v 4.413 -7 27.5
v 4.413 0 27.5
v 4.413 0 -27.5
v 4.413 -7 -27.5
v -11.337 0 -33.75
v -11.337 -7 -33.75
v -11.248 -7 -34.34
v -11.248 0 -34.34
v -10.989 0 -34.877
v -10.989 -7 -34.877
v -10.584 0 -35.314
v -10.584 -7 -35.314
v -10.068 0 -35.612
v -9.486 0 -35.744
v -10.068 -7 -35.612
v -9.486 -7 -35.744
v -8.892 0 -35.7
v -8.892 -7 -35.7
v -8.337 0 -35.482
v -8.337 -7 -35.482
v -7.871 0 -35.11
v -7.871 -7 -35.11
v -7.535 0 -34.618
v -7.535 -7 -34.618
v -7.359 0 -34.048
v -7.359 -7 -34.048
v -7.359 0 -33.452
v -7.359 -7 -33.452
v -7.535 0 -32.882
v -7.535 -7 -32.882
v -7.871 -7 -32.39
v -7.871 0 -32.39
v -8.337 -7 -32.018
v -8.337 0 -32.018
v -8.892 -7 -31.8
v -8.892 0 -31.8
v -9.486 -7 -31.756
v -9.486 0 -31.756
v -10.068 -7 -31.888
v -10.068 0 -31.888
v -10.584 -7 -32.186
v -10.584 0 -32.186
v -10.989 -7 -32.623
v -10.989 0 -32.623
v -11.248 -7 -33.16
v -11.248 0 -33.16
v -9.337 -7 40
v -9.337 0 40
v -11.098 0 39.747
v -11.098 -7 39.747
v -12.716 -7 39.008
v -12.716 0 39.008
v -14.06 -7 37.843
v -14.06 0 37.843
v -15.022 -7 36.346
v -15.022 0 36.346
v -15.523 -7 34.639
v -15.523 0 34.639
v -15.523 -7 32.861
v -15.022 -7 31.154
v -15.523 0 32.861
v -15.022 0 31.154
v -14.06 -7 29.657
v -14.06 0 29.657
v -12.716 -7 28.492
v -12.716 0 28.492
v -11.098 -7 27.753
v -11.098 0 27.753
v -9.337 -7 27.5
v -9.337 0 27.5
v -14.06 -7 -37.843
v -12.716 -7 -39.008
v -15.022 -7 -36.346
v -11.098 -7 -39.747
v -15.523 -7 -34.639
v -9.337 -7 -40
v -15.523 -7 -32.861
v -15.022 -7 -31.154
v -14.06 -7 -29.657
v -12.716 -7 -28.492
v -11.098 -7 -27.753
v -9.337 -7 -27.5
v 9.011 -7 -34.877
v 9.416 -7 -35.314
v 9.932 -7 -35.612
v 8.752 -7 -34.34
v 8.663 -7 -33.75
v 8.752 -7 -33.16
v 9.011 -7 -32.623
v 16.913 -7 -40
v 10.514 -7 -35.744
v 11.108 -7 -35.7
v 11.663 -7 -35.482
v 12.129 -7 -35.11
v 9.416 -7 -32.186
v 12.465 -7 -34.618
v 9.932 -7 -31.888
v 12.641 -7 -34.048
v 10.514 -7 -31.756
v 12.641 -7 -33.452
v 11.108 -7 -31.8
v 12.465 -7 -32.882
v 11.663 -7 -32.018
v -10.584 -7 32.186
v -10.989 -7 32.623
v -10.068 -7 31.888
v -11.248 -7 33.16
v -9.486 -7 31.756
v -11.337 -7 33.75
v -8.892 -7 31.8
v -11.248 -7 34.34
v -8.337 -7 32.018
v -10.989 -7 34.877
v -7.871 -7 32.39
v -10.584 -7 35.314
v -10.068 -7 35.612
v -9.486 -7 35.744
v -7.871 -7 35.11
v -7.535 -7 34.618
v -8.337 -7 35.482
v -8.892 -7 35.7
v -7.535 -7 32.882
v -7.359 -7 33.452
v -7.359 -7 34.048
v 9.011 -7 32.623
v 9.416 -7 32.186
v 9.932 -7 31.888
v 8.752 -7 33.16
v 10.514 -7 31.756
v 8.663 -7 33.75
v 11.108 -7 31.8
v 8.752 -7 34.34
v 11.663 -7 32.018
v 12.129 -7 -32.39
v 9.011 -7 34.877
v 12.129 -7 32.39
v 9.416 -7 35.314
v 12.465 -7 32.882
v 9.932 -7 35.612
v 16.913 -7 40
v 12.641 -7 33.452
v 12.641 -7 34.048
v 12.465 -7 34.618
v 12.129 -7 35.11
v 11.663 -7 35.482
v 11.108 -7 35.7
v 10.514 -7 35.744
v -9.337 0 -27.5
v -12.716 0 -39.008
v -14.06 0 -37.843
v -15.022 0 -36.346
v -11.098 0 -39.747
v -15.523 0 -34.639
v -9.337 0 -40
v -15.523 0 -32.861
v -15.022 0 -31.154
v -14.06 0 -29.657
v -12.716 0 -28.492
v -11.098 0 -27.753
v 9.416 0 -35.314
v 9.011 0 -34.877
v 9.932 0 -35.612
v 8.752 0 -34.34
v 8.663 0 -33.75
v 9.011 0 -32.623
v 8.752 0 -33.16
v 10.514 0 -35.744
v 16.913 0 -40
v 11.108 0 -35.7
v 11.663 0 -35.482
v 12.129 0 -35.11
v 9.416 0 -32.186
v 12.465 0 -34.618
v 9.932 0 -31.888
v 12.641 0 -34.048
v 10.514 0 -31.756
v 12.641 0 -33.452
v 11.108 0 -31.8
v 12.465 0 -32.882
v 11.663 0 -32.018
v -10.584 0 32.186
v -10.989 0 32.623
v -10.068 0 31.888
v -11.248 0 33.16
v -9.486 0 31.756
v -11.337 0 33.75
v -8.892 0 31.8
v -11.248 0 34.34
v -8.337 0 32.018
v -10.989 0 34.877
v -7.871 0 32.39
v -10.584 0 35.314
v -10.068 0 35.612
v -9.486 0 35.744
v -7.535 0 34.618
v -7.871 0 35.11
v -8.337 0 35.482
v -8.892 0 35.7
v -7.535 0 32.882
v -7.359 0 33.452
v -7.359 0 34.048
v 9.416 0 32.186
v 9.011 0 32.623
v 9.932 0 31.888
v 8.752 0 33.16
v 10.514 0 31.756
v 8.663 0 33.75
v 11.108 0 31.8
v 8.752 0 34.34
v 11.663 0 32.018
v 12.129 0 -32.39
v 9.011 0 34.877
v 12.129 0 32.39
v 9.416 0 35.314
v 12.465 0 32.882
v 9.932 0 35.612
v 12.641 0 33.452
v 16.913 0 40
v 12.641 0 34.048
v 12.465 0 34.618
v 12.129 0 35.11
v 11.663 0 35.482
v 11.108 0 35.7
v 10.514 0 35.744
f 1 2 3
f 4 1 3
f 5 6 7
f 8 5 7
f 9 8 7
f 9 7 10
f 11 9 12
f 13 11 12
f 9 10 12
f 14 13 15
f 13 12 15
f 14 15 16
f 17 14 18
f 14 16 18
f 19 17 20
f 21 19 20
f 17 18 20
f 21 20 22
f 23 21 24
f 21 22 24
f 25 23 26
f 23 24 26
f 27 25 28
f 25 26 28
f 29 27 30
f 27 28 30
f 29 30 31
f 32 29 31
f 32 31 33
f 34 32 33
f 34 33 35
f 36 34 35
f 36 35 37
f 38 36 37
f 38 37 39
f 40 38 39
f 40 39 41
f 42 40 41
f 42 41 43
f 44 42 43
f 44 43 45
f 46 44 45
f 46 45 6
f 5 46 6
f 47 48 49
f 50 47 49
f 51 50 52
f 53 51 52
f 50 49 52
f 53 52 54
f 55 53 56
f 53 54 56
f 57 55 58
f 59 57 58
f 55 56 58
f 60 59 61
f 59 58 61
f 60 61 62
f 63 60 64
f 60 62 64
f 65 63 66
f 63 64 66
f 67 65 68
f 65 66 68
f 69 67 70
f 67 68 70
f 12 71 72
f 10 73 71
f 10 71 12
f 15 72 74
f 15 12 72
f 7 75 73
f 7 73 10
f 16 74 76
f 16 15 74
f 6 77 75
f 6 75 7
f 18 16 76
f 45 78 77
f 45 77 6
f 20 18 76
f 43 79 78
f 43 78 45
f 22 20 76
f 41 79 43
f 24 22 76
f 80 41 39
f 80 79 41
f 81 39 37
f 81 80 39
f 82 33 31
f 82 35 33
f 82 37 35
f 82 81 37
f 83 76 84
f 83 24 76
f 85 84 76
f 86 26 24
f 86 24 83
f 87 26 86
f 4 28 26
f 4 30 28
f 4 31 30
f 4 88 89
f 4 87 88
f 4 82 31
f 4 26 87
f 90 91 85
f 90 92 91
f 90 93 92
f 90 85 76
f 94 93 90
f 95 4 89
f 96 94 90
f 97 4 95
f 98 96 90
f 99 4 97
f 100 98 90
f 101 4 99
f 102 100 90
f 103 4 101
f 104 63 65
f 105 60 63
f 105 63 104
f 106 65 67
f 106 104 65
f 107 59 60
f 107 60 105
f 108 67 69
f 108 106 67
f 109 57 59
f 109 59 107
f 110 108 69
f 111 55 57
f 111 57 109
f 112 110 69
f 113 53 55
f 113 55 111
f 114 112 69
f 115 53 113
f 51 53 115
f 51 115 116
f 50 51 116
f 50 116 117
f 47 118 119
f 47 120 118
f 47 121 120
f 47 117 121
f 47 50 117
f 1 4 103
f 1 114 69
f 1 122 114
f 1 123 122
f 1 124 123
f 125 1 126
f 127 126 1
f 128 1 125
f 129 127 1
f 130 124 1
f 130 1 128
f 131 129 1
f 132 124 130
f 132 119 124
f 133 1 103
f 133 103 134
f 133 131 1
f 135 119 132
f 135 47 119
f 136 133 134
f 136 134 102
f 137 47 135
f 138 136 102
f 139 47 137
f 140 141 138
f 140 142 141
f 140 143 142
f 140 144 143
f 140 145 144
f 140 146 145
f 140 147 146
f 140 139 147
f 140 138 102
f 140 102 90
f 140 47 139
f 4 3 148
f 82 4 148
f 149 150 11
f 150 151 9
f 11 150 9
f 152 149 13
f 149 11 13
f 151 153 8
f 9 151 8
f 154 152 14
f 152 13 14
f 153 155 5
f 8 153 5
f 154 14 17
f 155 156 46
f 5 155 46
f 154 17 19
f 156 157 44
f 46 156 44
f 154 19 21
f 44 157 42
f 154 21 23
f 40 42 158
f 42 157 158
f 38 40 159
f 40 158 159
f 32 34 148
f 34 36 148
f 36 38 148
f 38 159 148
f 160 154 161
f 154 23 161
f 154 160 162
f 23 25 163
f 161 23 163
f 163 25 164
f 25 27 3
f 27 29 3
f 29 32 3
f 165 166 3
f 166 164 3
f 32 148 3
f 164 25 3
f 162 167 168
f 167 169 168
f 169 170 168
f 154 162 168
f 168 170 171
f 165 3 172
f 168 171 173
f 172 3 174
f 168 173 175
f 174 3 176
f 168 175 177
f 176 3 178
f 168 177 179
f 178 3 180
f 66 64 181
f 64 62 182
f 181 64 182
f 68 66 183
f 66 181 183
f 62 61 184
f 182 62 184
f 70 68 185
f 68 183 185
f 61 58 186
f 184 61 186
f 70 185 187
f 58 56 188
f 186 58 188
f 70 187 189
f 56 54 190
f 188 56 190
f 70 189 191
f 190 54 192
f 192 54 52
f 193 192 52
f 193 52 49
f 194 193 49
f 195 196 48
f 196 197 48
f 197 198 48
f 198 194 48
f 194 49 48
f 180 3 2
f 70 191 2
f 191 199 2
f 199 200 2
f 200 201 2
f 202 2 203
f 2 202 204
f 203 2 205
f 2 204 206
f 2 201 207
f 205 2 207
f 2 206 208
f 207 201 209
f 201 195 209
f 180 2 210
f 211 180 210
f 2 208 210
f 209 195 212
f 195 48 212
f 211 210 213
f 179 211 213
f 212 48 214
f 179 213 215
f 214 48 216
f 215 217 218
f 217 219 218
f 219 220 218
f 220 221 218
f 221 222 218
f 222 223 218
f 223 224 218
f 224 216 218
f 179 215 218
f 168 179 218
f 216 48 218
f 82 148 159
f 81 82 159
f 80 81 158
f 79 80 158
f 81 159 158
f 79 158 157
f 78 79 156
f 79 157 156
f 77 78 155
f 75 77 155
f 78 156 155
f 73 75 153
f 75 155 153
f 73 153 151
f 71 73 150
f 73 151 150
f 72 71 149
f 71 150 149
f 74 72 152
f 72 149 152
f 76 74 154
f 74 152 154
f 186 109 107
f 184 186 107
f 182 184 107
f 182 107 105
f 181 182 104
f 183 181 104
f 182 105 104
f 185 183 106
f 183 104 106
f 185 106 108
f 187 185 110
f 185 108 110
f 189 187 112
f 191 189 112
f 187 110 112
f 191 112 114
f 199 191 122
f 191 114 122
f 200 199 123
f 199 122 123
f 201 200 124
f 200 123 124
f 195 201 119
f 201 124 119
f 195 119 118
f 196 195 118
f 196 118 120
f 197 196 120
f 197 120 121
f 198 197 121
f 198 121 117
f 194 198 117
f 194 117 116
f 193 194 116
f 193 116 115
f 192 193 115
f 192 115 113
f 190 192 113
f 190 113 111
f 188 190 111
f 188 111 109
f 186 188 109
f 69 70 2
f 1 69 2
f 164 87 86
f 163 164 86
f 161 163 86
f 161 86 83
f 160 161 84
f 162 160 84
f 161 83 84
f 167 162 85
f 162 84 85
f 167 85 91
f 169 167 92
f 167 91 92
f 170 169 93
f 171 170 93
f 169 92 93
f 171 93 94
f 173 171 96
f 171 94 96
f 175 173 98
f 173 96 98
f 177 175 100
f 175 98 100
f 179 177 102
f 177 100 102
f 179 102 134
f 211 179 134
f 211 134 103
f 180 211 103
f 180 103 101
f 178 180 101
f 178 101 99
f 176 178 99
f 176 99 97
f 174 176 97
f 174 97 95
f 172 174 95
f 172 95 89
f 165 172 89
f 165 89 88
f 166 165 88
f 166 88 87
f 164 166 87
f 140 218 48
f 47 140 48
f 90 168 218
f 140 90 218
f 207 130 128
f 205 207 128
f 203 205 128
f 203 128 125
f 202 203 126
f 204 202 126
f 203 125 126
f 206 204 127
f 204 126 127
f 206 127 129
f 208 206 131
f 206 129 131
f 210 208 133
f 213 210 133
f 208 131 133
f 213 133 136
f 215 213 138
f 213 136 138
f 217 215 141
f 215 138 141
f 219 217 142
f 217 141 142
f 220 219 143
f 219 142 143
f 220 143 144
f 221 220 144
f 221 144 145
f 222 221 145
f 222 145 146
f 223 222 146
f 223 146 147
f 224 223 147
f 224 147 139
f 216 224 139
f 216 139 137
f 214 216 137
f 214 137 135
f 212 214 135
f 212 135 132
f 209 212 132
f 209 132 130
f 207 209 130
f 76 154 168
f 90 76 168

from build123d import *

# Parameters (mm, degrees)
F1_DEPTH = 7
F2_D     = 4


with BuildPart() as f1:
    # F0 (on Front) → F1 (new body)
    with BuildSketch(Plane.XZ):
        with BuildLine():
            Line((4.413146, 27.5), (4.413146, -27.5))
            Line((4.413146, -27.5), (-9.336854, -27.5))
            ThreePointArc((-9.336854, -27.5), (-15.586854, -33.75), (-9.336854, -40))
            Line((-9.336854, -40), (16.913146, -40))
            Line((16.913146, -40), (16.913146, 40))
            Line((16.913146, 40), (-9.336854, 40))
            ThreePointArc((-9.336854, 40), (-15.586854, 33.75), (-9.336854, 27.5))
            Line((-9.336854, 27.5), (4.413146, 27.5))
        make_face()
    extrude(amount=F1_DEPTH)

    # F2 (through all)
    with Locations(Plane(origin=(0, 0, 0), x_dir=(1, 0, 0), z_dir=(0, 1, 0))):
        with Locations((-9.336854, 33.75), (10.663146, 33.75), (-9.336854, -33.75), (10.663146, -33.75)):
            Hole(F2_D / 2)


solid = f1.part
